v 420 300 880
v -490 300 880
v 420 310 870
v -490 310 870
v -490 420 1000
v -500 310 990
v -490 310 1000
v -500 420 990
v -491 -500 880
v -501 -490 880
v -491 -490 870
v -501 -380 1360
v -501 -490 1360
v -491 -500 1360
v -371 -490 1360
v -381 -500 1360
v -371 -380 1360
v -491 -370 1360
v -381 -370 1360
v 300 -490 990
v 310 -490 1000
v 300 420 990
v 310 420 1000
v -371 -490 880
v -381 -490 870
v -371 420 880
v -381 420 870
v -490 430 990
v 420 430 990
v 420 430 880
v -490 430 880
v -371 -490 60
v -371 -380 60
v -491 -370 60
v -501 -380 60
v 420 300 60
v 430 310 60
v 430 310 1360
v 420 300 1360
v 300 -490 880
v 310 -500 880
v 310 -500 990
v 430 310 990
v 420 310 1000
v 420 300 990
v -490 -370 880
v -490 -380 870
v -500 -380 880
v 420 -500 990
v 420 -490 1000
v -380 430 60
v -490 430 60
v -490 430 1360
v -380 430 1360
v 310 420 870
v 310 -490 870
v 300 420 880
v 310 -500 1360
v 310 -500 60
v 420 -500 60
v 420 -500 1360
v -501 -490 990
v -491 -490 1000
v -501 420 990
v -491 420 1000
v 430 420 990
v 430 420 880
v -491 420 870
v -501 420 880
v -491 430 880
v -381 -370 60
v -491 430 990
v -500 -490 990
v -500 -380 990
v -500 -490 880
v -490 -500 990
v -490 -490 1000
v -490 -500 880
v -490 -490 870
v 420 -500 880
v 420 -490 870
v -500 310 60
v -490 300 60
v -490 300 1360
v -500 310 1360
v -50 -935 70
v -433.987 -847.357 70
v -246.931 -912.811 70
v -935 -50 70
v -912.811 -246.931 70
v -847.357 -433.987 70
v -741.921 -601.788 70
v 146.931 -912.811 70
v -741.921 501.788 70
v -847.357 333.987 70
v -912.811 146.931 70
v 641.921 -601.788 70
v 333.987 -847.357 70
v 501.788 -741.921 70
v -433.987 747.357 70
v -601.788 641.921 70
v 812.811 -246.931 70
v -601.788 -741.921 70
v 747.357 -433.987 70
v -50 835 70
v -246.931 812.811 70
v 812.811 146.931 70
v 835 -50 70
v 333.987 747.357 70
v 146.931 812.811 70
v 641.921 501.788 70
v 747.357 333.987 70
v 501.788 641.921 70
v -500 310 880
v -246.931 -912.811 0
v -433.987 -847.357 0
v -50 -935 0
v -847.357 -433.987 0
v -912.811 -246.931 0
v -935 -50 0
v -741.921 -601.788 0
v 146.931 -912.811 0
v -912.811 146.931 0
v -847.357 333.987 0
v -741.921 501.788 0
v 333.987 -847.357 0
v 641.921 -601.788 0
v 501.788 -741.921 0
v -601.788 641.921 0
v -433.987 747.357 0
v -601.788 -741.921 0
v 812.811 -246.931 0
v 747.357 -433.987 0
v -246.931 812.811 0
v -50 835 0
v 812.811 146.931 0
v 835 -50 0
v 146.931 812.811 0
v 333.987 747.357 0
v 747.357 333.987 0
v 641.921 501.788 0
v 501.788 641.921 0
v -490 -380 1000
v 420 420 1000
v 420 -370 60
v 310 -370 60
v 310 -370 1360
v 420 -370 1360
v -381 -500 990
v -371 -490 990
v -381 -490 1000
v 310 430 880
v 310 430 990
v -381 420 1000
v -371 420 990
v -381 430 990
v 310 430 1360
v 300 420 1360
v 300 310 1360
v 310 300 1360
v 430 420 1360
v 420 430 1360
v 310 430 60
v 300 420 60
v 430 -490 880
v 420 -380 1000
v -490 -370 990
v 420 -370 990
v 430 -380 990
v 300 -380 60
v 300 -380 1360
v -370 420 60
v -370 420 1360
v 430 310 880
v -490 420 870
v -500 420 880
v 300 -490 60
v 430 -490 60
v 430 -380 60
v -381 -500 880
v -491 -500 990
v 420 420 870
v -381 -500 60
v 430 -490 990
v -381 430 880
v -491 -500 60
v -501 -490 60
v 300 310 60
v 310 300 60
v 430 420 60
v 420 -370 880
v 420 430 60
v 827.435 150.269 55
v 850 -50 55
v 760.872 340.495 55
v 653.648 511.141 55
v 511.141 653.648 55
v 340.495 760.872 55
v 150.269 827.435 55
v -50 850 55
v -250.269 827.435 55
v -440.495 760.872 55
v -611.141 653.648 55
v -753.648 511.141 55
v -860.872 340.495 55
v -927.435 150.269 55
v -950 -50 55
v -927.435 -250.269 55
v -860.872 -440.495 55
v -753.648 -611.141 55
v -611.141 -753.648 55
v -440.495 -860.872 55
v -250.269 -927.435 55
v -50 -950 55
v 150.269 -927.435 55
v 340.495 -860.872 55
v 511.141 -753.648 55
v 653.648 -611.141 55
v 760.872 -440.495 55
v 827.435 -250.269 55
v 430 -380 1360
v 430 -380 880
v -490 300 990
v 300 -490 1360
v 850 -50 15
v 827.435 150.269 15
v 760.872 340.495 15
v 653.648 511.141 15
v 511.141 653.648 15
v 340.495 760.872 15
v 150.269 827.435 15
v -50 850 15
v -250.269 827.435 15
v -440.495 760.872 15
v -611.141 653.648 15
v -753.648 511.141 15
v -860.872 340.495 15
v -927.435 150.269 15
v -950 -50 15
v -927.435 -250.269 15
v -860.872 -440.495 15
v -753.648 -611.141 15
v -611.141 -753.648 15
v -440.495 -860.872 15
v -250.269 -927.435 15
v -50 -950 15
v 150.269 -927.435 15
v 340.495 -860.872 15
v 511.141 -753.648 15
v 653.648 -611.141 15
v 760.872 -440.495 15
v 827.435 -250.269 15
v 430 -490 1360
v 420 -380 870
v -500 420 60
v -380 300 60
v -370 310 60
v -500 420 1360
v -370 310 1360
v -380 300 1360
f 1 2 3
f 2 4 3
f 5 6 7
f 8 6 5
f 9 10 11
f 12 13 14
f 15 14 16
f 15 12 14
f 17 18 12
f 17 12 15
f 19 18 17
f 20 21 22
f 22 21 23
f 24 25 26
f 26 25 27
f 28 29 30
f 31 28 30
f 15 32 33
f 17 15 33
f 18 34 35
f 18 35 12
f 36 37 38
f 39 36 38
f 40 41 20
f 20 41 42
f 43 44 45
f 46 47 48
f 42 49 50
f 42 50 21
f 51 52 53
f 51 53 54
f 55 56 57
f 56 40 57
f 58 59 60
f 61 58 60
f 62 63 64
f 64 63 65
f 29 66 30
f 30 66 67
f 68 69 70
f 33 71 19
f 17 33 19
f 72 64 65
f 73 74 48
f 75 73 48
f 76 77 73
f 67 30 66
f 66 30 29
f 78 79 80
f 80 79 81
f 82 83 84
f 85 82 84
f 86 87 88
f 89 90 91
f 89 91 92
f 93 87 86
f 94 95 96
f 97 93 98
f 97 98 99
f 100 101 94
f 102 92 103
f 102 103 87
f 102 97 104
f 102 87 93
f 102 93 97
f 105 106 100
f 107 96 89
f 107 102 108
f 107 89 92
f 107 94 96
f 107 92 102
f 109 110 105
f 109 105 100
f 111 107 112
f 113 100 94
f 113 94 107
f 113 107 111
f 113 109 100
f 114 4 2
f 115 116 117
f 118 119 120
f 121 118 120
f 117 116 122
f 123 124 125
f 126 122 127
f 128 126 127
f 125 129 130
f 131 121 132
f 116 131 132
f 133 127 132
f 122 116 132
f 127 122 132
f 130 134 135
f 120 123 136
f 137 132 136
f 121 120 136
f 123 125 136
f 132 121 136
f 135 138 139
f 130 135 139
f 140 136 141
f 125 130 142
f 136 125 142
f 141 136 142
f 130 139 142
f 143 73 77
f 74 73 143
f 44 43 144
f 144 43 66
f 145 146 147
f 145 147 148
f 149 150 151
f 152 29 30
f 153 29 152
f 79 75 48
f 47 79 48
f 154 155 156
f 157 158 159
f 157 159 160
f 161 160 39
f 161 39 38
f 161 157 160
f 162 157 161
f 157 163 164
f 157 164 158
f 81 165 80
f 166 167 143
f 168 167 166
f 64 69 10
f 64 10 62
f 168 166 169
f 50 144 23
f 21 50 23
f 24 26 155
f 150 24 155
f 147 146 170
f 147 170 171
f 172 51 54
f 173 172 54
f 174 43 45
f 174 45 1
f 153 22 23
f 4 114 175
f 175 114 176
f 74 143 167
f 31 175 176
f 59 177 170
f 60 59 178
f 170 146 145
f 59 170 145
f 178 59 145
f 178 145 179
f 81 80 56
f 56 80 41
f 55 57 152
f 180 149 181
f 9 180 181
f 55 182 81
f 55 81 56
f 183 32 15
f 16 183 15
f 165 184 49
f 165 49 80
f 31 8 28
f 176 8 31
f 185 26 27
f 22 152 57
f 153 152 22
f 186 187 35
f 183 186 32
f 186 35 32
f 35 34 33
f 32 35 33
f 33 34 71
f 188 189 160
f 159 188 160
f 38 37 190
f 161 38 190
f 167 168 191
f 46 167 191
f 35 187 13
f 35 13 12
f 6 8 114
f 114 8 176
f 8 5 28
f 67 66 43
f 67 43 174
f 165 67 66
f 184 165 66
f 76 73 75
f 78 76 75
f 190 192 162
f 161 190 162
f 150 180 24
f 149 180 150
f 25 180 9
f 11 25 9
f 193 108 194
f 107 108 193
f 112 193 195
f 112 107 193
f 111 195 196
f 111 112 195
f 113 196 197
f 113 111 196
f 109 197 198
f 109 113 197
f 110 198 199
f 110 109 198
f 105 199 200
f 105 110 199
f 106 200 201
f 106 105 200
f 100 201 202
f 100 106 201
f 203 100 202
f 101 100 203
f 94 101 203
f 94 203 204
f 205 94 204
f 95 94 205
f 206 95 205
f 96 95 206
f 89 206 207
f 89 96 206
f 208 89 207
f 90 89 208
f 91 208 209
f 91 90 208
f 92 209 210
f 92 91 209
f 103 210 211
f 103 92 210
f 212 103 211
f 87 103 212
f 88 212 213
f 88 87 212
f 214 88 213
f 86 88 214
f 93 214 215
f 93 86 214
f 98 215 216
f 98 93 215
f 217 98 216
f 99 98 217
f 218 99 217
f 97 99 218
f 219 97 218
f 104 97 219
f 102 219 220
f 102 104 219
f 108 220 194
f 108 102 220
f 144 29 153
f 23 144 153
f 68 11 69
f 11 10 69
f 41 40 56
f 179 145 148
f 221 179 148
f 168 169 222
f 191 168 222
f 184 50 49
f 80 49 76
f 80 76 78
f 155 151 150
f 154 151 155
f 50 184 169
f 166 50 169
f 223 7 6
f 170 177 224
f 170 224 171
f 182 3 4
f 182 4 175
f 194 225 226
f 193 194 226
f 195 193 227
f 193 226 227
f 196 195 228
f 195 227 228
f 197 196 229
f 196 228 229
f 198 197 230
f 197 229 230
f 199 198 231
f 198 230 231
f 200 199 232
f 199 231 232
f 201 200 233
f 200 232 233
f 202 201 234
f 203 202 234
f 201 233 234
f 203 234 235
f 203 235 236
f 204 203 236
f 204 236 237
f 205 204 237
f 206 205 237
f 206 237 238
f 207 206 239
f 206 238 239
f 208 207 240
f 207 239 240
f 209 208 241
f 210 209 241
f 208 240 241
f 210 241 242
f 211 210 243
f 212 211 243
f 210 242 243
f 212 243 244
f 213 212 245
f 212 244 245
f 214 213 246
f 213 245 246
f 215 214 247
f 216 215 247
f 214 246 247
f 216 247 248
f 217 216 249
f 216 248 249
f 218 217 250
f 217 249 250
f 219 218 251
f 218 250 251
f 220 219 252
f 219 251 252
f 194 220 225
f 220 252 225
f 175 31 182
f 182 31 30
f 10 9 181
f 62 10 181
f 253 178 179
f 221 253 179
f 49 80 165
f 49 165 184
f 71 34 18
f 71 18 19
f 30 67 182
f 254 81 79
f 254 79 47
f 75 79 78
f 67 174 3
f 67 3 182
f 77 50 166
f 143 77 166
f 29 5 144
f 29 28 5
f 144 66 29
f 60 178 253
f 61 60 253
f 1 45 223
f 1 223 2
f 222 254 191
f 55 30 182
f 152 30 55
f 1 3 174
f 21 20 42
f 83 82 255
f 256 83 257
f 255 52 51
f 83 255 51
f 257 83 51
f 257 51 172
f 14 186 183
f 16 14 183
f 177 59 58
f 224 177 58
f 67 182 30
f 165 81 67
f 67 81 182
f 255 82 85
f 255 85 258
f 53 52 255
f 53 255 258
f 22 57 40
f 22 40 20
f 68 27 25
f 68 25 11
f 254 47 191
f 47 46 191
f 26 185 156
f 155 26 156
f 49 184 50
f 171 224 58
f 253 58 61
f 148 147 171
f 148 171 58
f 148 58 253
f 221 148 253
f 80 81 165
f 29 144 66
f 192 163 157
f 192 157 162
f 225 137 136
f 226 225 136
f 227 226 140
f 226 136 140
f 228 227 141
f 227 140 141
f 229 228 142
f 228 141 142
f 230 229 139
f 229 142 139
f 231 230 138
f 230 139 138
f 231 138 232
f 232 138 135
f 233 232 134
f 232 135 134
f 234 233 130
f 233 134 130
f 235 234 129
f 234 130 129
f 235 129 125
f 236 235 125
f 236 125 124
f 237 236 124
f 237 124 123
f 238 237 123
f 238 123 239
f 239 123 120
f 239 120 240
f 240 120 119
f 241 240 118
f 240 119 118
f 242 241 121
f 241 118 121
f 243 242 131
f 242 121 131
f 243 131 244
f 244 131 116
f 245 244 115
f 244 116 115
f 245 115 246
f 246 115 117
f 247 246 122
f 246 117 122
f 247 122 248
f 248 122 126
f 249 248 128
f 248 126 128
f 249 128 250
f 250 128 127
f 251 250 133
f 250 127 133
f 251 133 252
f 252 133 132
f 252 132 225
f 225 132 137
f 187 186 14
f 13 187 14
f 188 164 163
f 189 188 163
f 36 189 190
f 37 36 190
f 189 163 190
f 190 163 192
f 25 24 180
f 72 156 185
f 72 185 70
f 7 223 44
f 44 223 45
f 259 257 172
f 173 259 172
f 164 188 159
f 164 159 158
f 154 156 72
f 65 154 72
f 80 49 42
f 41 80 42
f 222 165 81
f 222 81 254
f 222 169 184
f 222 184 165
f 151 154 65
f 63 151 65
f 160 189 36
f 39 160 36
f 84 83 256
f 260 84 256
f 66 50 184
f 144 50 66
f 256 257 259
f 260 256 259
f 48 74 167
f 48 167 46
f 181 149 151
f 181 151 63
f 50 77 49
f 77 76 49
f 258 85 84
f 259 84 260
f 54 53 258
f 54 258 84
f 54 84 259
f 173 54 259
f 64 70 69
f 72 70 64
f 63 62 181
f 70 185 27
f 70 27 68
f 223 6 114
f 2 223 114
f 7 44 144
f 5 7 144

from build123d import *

# Parameters (mm, degrees)
CYLINDER_R      = 900
CYLINDER_DEPTH  = 70
CHAMFER_SIZE    = 15
BOX_W           = 130
BOX_H           = 130
BOX_DEPTH       = 1300
CHAMFER001_SIZE = 10
BOX001_W        = 130
BOX001_H        = 130
BOX001_DEPTH    = 1300
CHAMFER002_SIZE = 10
BOX002_W        = 130
BOX002_H        = 130
BOX002_DEPTH    = 1300
CHAMFER003_SIZE = 10
BOX003_W        = 130
BOX003_H        = 130
BOX003_DEPTH    = 1300
CHAMFER004_SIZE = 10
BOX004_W        = 130
BOX004_H        = 130
BOX004_DEPTH    = 930
CHAMFER005_SIZE = 10
BOX005_W        = 130
BOX005_H        = 130
BOX005_DEPTH    = 930
CHAMFER006_SIZE = 10
BOX006_W        = 130
BOX006_H        = 130
BOX006_DEPTH    = 930
CHAMFER007_SIZE = 10
BOX007_W        = 130
BOX007_H        = 130
BOX007_DEPTH    = 930
CHAMFER008_SIZE = 10


with BuildPart() as chamfer_body:
    # Cylinder → Cylinder (new body)
    with BuildSketch(Plane(origin=(-50, -50, 0), x_dir=(1, 0, 0), z_dir=(0, 0, 1))):
        Circle(CYLINDER_R)
    extrude(amount=CYLINDER_DEPTH)

    # Chamfer
    chamfer_edges = [chamfer_body.edges().sort_by_distance(p)[0] for p in [
        (-950, -50, 0),
        (-950, -50, 70),
    ]]
    chamfer(chamfer_edges, length=CHAMFER_SIZE)


with BuildPart() as chamfer001:
    # Box → Box (new body)
    with BuildSketch(Plane(origin=(-501, -500, 60), x_dir=(1, 0, 0), z_dir=(0, 0, 1))):
        with Locations((65, 65)):
            Rectangle(BOX_W, BOX_H)
    extrude(amount=BOX_DEPTH)

    # Chamfer001
    chamfer001_edges = [chamfer001.edges().sort_by_distance(p)[0] for p in [
        (-501, -500, 710),
        (-501, -370, 710),
        (-371, -500, 710),
        (-371, -370, 710),
    ]]
    chamfer(chamfer001_edges, length=CHAMFER001_SIZE)


with BuildPart() as chamfer002:
    # Box001 → Box001 (new body)
    with BuildSketch(Plane(origin=(300, -500, 60), x_dir=(1, 0, 0), z_dir=(0, 0, 1))):
        with Locations((65, 65)):
            Rectangle(BOX001_W, BOX001_H)
    extrude(amount=BOX001_DEPTH)

    # Chamfer002
    chamfer002_edges = [chamfer002.edges().sort_by_distance(p)[0] for p in [
        (300, -500, 710),
        (300, -370, 710),
        (430, -500, 710),
        (430, -370, 710),
    ]]
    chamfer(chamfer002_edges, length=CHAMFER002_SIZE)


with BuildPart() as chamfer003:
    # Box002 → Box002 (new body)
    with BuildSketch(Plane(origin=(300, 300, 60), x_dir=(1, 0, 0), z_dir=(0, 0, 1))):
        with Locations((65, 65)):
            Rectangle(BOX002_W, BOX002_H)
    extrude(amount=BOX002_DEPTH)

    # Chamfer003
    chamfer003_edges = [chamfer003.edges().sort_by_distance(p)[0] for p in [
        (300, 300, 710),
        (300, 430, 710),
        (430, 300, 710),
        (430, 430, 710),
    ]]
    chamfer(chamfer003_edges, length=CHAMFER003_SIZE)


with BuildPart() as chamfer004:
    # Box003 → Box003 (new body)
    with BuildSketch(Plane(origin=(-500, 300, 60), x_dir=(1, 0, 0), z_dir=(0, 0, 1))):
        with Locations((65, 65)):
            Rectangle(BOX003_W, BOX003_H)
    extrude(amount=BOX003_DEPTH)

    # Chamfer004
    chamfer004_edges = [chamfer004.edges().sort_by_distance(p)[0] for p in [
        (-500, 300, 710),
        (-500, 430, 710),
        (-370, 300, 710),
        (-370, 430, 710),
    ]]
    chamfer(chamfer004_edges, length=CHAMFER004_SIZE)


with BuildPart() as chamfer005:
    # Box004 → Box004 (new body)
    with BuildSketch(Plane(origin=(-500, 300, 1000), x_dir=(0, 0, -1), z_dir=(1, 0, 0))):
        with Locations((65, 65)):
            Rectangle(BOX004_W, BOX004_H)
    extrude(amount=BOX004_DEPTH)

    # Chamfer005
    chamfer005_edges = [chamfer005.edges().sort_by_distance(p)[0] for p in [
        (-35, 300, 1000),
        (430, 365, 1000),
        (-35, 430, 1000),
        (-500, 365, 1000),
        (-35, 300, 870),
        (430, 365, 870),
        (-35, 430, 870),
        (-500, 365, 870),
        (-500, 300, 935),
        (430, 300, 935),
        (-500, 430, 935),
        (430, 430, 935),
    ]]
    chamfer(chamfer005_edges, length=CHAMFER005_SIZE)


with BuildPart() as chamfer006:
    # Box005 → Box005 (new body)
    with BuildSketch(Plane(origin=(-500, -500, 1000), x_dir=(0, 0, -1), z_dir=(1, 0, 0))):
        with Locations((65, 65)):
            Rectangle(BOX005_W, BOX005_H)
    extrude(amount=BOX005_DEPTH)

    # Chamfer006
    chamfer006_edges = [chamfer006.edges().sort_by_distance(p)[0] for p in [
        (-35, -500, 1000),
        (430, -435, 1000),
        (-35, -370, 1000),
        (-500, -435, 1000),
        (-35, -500, 870),
        (430, -435, 870),
        (-35, -370, 870),
        (-500, -435, 870),
        (-500, -500, 935),
        (430, -500, 935),
        (-500, -370, 935),
        (430, -370, 935),
    ]]
    chamfer(chamfer006_edges, length=CHAMFER006_SIZE)


with BuildPart() as chamfer007:
    # Box006 → Box006 (new body)
    with BuildSketch(Plane(origin=(-371, -500, 870), x_dir=(-1, 0, 0), z_dir=(0, 1, 0))):
        with Locations((65, 65)):
            Rectangle(BOX006_W, BOX006_H)
    extrude(amount=BOX006_DEPTH)

    # Chamfer007
    chamfer007_edges = [chamfer007.edges().sort_by_distance(p)[0] for p in [
        (-371, -35, 870),
        (-371, 430, 935),
        (-371, -35, 1000),
        (-371, -500, 935),
        (-501, -35, 870),
        (-501, 430, 935),
        (-501, -35, 1000),
        (-501, -500, 935),
        (-436, -500, 870),
        (-436, 430, 870),
        (-436, -500, 1000),
        (-436, 430, 1000),
    ]]
    chamfer(chamfer007_edges, length=CHAMFER007_SIZE)


with BuildPart() as chamfer008:
    # Box007 → Box007 (new body)
    with BuildSketch(Plane(origin=(430, -500, 870), x_dir=(-1, 0, 0), z_dir=(0, 1, 0))):
        with Locations((65, 65)):
            Rectangle(BOX007_W, BOX007_H)
    extrude(amount=BOX007_DEPTH)

    # Chamfer008
    chamfer008_edges = [chamfer008.edges().sort_by_distance(p)[0] for p in [
        (430, -35, 870),
        (430, 430, 935),
        (430, -35, 1000),
        (430, -500, 935),
        (300, -35, 870),
        (300, 430, 935),
        (300, -35, 1000),
        (300, -500, 935),
        (365, -500, 870),
        (365, 430, 870),
        (365, -500, 1000),
        (365, 430, 1000),
    ]]
    chamfer(chamfer008_edges, length=CHAMFER008_SIZE)


solid = Compound([chamfer_body.part, chamfer001.part, chamfer002.part, chamfer003.part, chamfer004.part, chamfer005.part, chamfer006.part, chamfer007.part, chamfer008.part])
